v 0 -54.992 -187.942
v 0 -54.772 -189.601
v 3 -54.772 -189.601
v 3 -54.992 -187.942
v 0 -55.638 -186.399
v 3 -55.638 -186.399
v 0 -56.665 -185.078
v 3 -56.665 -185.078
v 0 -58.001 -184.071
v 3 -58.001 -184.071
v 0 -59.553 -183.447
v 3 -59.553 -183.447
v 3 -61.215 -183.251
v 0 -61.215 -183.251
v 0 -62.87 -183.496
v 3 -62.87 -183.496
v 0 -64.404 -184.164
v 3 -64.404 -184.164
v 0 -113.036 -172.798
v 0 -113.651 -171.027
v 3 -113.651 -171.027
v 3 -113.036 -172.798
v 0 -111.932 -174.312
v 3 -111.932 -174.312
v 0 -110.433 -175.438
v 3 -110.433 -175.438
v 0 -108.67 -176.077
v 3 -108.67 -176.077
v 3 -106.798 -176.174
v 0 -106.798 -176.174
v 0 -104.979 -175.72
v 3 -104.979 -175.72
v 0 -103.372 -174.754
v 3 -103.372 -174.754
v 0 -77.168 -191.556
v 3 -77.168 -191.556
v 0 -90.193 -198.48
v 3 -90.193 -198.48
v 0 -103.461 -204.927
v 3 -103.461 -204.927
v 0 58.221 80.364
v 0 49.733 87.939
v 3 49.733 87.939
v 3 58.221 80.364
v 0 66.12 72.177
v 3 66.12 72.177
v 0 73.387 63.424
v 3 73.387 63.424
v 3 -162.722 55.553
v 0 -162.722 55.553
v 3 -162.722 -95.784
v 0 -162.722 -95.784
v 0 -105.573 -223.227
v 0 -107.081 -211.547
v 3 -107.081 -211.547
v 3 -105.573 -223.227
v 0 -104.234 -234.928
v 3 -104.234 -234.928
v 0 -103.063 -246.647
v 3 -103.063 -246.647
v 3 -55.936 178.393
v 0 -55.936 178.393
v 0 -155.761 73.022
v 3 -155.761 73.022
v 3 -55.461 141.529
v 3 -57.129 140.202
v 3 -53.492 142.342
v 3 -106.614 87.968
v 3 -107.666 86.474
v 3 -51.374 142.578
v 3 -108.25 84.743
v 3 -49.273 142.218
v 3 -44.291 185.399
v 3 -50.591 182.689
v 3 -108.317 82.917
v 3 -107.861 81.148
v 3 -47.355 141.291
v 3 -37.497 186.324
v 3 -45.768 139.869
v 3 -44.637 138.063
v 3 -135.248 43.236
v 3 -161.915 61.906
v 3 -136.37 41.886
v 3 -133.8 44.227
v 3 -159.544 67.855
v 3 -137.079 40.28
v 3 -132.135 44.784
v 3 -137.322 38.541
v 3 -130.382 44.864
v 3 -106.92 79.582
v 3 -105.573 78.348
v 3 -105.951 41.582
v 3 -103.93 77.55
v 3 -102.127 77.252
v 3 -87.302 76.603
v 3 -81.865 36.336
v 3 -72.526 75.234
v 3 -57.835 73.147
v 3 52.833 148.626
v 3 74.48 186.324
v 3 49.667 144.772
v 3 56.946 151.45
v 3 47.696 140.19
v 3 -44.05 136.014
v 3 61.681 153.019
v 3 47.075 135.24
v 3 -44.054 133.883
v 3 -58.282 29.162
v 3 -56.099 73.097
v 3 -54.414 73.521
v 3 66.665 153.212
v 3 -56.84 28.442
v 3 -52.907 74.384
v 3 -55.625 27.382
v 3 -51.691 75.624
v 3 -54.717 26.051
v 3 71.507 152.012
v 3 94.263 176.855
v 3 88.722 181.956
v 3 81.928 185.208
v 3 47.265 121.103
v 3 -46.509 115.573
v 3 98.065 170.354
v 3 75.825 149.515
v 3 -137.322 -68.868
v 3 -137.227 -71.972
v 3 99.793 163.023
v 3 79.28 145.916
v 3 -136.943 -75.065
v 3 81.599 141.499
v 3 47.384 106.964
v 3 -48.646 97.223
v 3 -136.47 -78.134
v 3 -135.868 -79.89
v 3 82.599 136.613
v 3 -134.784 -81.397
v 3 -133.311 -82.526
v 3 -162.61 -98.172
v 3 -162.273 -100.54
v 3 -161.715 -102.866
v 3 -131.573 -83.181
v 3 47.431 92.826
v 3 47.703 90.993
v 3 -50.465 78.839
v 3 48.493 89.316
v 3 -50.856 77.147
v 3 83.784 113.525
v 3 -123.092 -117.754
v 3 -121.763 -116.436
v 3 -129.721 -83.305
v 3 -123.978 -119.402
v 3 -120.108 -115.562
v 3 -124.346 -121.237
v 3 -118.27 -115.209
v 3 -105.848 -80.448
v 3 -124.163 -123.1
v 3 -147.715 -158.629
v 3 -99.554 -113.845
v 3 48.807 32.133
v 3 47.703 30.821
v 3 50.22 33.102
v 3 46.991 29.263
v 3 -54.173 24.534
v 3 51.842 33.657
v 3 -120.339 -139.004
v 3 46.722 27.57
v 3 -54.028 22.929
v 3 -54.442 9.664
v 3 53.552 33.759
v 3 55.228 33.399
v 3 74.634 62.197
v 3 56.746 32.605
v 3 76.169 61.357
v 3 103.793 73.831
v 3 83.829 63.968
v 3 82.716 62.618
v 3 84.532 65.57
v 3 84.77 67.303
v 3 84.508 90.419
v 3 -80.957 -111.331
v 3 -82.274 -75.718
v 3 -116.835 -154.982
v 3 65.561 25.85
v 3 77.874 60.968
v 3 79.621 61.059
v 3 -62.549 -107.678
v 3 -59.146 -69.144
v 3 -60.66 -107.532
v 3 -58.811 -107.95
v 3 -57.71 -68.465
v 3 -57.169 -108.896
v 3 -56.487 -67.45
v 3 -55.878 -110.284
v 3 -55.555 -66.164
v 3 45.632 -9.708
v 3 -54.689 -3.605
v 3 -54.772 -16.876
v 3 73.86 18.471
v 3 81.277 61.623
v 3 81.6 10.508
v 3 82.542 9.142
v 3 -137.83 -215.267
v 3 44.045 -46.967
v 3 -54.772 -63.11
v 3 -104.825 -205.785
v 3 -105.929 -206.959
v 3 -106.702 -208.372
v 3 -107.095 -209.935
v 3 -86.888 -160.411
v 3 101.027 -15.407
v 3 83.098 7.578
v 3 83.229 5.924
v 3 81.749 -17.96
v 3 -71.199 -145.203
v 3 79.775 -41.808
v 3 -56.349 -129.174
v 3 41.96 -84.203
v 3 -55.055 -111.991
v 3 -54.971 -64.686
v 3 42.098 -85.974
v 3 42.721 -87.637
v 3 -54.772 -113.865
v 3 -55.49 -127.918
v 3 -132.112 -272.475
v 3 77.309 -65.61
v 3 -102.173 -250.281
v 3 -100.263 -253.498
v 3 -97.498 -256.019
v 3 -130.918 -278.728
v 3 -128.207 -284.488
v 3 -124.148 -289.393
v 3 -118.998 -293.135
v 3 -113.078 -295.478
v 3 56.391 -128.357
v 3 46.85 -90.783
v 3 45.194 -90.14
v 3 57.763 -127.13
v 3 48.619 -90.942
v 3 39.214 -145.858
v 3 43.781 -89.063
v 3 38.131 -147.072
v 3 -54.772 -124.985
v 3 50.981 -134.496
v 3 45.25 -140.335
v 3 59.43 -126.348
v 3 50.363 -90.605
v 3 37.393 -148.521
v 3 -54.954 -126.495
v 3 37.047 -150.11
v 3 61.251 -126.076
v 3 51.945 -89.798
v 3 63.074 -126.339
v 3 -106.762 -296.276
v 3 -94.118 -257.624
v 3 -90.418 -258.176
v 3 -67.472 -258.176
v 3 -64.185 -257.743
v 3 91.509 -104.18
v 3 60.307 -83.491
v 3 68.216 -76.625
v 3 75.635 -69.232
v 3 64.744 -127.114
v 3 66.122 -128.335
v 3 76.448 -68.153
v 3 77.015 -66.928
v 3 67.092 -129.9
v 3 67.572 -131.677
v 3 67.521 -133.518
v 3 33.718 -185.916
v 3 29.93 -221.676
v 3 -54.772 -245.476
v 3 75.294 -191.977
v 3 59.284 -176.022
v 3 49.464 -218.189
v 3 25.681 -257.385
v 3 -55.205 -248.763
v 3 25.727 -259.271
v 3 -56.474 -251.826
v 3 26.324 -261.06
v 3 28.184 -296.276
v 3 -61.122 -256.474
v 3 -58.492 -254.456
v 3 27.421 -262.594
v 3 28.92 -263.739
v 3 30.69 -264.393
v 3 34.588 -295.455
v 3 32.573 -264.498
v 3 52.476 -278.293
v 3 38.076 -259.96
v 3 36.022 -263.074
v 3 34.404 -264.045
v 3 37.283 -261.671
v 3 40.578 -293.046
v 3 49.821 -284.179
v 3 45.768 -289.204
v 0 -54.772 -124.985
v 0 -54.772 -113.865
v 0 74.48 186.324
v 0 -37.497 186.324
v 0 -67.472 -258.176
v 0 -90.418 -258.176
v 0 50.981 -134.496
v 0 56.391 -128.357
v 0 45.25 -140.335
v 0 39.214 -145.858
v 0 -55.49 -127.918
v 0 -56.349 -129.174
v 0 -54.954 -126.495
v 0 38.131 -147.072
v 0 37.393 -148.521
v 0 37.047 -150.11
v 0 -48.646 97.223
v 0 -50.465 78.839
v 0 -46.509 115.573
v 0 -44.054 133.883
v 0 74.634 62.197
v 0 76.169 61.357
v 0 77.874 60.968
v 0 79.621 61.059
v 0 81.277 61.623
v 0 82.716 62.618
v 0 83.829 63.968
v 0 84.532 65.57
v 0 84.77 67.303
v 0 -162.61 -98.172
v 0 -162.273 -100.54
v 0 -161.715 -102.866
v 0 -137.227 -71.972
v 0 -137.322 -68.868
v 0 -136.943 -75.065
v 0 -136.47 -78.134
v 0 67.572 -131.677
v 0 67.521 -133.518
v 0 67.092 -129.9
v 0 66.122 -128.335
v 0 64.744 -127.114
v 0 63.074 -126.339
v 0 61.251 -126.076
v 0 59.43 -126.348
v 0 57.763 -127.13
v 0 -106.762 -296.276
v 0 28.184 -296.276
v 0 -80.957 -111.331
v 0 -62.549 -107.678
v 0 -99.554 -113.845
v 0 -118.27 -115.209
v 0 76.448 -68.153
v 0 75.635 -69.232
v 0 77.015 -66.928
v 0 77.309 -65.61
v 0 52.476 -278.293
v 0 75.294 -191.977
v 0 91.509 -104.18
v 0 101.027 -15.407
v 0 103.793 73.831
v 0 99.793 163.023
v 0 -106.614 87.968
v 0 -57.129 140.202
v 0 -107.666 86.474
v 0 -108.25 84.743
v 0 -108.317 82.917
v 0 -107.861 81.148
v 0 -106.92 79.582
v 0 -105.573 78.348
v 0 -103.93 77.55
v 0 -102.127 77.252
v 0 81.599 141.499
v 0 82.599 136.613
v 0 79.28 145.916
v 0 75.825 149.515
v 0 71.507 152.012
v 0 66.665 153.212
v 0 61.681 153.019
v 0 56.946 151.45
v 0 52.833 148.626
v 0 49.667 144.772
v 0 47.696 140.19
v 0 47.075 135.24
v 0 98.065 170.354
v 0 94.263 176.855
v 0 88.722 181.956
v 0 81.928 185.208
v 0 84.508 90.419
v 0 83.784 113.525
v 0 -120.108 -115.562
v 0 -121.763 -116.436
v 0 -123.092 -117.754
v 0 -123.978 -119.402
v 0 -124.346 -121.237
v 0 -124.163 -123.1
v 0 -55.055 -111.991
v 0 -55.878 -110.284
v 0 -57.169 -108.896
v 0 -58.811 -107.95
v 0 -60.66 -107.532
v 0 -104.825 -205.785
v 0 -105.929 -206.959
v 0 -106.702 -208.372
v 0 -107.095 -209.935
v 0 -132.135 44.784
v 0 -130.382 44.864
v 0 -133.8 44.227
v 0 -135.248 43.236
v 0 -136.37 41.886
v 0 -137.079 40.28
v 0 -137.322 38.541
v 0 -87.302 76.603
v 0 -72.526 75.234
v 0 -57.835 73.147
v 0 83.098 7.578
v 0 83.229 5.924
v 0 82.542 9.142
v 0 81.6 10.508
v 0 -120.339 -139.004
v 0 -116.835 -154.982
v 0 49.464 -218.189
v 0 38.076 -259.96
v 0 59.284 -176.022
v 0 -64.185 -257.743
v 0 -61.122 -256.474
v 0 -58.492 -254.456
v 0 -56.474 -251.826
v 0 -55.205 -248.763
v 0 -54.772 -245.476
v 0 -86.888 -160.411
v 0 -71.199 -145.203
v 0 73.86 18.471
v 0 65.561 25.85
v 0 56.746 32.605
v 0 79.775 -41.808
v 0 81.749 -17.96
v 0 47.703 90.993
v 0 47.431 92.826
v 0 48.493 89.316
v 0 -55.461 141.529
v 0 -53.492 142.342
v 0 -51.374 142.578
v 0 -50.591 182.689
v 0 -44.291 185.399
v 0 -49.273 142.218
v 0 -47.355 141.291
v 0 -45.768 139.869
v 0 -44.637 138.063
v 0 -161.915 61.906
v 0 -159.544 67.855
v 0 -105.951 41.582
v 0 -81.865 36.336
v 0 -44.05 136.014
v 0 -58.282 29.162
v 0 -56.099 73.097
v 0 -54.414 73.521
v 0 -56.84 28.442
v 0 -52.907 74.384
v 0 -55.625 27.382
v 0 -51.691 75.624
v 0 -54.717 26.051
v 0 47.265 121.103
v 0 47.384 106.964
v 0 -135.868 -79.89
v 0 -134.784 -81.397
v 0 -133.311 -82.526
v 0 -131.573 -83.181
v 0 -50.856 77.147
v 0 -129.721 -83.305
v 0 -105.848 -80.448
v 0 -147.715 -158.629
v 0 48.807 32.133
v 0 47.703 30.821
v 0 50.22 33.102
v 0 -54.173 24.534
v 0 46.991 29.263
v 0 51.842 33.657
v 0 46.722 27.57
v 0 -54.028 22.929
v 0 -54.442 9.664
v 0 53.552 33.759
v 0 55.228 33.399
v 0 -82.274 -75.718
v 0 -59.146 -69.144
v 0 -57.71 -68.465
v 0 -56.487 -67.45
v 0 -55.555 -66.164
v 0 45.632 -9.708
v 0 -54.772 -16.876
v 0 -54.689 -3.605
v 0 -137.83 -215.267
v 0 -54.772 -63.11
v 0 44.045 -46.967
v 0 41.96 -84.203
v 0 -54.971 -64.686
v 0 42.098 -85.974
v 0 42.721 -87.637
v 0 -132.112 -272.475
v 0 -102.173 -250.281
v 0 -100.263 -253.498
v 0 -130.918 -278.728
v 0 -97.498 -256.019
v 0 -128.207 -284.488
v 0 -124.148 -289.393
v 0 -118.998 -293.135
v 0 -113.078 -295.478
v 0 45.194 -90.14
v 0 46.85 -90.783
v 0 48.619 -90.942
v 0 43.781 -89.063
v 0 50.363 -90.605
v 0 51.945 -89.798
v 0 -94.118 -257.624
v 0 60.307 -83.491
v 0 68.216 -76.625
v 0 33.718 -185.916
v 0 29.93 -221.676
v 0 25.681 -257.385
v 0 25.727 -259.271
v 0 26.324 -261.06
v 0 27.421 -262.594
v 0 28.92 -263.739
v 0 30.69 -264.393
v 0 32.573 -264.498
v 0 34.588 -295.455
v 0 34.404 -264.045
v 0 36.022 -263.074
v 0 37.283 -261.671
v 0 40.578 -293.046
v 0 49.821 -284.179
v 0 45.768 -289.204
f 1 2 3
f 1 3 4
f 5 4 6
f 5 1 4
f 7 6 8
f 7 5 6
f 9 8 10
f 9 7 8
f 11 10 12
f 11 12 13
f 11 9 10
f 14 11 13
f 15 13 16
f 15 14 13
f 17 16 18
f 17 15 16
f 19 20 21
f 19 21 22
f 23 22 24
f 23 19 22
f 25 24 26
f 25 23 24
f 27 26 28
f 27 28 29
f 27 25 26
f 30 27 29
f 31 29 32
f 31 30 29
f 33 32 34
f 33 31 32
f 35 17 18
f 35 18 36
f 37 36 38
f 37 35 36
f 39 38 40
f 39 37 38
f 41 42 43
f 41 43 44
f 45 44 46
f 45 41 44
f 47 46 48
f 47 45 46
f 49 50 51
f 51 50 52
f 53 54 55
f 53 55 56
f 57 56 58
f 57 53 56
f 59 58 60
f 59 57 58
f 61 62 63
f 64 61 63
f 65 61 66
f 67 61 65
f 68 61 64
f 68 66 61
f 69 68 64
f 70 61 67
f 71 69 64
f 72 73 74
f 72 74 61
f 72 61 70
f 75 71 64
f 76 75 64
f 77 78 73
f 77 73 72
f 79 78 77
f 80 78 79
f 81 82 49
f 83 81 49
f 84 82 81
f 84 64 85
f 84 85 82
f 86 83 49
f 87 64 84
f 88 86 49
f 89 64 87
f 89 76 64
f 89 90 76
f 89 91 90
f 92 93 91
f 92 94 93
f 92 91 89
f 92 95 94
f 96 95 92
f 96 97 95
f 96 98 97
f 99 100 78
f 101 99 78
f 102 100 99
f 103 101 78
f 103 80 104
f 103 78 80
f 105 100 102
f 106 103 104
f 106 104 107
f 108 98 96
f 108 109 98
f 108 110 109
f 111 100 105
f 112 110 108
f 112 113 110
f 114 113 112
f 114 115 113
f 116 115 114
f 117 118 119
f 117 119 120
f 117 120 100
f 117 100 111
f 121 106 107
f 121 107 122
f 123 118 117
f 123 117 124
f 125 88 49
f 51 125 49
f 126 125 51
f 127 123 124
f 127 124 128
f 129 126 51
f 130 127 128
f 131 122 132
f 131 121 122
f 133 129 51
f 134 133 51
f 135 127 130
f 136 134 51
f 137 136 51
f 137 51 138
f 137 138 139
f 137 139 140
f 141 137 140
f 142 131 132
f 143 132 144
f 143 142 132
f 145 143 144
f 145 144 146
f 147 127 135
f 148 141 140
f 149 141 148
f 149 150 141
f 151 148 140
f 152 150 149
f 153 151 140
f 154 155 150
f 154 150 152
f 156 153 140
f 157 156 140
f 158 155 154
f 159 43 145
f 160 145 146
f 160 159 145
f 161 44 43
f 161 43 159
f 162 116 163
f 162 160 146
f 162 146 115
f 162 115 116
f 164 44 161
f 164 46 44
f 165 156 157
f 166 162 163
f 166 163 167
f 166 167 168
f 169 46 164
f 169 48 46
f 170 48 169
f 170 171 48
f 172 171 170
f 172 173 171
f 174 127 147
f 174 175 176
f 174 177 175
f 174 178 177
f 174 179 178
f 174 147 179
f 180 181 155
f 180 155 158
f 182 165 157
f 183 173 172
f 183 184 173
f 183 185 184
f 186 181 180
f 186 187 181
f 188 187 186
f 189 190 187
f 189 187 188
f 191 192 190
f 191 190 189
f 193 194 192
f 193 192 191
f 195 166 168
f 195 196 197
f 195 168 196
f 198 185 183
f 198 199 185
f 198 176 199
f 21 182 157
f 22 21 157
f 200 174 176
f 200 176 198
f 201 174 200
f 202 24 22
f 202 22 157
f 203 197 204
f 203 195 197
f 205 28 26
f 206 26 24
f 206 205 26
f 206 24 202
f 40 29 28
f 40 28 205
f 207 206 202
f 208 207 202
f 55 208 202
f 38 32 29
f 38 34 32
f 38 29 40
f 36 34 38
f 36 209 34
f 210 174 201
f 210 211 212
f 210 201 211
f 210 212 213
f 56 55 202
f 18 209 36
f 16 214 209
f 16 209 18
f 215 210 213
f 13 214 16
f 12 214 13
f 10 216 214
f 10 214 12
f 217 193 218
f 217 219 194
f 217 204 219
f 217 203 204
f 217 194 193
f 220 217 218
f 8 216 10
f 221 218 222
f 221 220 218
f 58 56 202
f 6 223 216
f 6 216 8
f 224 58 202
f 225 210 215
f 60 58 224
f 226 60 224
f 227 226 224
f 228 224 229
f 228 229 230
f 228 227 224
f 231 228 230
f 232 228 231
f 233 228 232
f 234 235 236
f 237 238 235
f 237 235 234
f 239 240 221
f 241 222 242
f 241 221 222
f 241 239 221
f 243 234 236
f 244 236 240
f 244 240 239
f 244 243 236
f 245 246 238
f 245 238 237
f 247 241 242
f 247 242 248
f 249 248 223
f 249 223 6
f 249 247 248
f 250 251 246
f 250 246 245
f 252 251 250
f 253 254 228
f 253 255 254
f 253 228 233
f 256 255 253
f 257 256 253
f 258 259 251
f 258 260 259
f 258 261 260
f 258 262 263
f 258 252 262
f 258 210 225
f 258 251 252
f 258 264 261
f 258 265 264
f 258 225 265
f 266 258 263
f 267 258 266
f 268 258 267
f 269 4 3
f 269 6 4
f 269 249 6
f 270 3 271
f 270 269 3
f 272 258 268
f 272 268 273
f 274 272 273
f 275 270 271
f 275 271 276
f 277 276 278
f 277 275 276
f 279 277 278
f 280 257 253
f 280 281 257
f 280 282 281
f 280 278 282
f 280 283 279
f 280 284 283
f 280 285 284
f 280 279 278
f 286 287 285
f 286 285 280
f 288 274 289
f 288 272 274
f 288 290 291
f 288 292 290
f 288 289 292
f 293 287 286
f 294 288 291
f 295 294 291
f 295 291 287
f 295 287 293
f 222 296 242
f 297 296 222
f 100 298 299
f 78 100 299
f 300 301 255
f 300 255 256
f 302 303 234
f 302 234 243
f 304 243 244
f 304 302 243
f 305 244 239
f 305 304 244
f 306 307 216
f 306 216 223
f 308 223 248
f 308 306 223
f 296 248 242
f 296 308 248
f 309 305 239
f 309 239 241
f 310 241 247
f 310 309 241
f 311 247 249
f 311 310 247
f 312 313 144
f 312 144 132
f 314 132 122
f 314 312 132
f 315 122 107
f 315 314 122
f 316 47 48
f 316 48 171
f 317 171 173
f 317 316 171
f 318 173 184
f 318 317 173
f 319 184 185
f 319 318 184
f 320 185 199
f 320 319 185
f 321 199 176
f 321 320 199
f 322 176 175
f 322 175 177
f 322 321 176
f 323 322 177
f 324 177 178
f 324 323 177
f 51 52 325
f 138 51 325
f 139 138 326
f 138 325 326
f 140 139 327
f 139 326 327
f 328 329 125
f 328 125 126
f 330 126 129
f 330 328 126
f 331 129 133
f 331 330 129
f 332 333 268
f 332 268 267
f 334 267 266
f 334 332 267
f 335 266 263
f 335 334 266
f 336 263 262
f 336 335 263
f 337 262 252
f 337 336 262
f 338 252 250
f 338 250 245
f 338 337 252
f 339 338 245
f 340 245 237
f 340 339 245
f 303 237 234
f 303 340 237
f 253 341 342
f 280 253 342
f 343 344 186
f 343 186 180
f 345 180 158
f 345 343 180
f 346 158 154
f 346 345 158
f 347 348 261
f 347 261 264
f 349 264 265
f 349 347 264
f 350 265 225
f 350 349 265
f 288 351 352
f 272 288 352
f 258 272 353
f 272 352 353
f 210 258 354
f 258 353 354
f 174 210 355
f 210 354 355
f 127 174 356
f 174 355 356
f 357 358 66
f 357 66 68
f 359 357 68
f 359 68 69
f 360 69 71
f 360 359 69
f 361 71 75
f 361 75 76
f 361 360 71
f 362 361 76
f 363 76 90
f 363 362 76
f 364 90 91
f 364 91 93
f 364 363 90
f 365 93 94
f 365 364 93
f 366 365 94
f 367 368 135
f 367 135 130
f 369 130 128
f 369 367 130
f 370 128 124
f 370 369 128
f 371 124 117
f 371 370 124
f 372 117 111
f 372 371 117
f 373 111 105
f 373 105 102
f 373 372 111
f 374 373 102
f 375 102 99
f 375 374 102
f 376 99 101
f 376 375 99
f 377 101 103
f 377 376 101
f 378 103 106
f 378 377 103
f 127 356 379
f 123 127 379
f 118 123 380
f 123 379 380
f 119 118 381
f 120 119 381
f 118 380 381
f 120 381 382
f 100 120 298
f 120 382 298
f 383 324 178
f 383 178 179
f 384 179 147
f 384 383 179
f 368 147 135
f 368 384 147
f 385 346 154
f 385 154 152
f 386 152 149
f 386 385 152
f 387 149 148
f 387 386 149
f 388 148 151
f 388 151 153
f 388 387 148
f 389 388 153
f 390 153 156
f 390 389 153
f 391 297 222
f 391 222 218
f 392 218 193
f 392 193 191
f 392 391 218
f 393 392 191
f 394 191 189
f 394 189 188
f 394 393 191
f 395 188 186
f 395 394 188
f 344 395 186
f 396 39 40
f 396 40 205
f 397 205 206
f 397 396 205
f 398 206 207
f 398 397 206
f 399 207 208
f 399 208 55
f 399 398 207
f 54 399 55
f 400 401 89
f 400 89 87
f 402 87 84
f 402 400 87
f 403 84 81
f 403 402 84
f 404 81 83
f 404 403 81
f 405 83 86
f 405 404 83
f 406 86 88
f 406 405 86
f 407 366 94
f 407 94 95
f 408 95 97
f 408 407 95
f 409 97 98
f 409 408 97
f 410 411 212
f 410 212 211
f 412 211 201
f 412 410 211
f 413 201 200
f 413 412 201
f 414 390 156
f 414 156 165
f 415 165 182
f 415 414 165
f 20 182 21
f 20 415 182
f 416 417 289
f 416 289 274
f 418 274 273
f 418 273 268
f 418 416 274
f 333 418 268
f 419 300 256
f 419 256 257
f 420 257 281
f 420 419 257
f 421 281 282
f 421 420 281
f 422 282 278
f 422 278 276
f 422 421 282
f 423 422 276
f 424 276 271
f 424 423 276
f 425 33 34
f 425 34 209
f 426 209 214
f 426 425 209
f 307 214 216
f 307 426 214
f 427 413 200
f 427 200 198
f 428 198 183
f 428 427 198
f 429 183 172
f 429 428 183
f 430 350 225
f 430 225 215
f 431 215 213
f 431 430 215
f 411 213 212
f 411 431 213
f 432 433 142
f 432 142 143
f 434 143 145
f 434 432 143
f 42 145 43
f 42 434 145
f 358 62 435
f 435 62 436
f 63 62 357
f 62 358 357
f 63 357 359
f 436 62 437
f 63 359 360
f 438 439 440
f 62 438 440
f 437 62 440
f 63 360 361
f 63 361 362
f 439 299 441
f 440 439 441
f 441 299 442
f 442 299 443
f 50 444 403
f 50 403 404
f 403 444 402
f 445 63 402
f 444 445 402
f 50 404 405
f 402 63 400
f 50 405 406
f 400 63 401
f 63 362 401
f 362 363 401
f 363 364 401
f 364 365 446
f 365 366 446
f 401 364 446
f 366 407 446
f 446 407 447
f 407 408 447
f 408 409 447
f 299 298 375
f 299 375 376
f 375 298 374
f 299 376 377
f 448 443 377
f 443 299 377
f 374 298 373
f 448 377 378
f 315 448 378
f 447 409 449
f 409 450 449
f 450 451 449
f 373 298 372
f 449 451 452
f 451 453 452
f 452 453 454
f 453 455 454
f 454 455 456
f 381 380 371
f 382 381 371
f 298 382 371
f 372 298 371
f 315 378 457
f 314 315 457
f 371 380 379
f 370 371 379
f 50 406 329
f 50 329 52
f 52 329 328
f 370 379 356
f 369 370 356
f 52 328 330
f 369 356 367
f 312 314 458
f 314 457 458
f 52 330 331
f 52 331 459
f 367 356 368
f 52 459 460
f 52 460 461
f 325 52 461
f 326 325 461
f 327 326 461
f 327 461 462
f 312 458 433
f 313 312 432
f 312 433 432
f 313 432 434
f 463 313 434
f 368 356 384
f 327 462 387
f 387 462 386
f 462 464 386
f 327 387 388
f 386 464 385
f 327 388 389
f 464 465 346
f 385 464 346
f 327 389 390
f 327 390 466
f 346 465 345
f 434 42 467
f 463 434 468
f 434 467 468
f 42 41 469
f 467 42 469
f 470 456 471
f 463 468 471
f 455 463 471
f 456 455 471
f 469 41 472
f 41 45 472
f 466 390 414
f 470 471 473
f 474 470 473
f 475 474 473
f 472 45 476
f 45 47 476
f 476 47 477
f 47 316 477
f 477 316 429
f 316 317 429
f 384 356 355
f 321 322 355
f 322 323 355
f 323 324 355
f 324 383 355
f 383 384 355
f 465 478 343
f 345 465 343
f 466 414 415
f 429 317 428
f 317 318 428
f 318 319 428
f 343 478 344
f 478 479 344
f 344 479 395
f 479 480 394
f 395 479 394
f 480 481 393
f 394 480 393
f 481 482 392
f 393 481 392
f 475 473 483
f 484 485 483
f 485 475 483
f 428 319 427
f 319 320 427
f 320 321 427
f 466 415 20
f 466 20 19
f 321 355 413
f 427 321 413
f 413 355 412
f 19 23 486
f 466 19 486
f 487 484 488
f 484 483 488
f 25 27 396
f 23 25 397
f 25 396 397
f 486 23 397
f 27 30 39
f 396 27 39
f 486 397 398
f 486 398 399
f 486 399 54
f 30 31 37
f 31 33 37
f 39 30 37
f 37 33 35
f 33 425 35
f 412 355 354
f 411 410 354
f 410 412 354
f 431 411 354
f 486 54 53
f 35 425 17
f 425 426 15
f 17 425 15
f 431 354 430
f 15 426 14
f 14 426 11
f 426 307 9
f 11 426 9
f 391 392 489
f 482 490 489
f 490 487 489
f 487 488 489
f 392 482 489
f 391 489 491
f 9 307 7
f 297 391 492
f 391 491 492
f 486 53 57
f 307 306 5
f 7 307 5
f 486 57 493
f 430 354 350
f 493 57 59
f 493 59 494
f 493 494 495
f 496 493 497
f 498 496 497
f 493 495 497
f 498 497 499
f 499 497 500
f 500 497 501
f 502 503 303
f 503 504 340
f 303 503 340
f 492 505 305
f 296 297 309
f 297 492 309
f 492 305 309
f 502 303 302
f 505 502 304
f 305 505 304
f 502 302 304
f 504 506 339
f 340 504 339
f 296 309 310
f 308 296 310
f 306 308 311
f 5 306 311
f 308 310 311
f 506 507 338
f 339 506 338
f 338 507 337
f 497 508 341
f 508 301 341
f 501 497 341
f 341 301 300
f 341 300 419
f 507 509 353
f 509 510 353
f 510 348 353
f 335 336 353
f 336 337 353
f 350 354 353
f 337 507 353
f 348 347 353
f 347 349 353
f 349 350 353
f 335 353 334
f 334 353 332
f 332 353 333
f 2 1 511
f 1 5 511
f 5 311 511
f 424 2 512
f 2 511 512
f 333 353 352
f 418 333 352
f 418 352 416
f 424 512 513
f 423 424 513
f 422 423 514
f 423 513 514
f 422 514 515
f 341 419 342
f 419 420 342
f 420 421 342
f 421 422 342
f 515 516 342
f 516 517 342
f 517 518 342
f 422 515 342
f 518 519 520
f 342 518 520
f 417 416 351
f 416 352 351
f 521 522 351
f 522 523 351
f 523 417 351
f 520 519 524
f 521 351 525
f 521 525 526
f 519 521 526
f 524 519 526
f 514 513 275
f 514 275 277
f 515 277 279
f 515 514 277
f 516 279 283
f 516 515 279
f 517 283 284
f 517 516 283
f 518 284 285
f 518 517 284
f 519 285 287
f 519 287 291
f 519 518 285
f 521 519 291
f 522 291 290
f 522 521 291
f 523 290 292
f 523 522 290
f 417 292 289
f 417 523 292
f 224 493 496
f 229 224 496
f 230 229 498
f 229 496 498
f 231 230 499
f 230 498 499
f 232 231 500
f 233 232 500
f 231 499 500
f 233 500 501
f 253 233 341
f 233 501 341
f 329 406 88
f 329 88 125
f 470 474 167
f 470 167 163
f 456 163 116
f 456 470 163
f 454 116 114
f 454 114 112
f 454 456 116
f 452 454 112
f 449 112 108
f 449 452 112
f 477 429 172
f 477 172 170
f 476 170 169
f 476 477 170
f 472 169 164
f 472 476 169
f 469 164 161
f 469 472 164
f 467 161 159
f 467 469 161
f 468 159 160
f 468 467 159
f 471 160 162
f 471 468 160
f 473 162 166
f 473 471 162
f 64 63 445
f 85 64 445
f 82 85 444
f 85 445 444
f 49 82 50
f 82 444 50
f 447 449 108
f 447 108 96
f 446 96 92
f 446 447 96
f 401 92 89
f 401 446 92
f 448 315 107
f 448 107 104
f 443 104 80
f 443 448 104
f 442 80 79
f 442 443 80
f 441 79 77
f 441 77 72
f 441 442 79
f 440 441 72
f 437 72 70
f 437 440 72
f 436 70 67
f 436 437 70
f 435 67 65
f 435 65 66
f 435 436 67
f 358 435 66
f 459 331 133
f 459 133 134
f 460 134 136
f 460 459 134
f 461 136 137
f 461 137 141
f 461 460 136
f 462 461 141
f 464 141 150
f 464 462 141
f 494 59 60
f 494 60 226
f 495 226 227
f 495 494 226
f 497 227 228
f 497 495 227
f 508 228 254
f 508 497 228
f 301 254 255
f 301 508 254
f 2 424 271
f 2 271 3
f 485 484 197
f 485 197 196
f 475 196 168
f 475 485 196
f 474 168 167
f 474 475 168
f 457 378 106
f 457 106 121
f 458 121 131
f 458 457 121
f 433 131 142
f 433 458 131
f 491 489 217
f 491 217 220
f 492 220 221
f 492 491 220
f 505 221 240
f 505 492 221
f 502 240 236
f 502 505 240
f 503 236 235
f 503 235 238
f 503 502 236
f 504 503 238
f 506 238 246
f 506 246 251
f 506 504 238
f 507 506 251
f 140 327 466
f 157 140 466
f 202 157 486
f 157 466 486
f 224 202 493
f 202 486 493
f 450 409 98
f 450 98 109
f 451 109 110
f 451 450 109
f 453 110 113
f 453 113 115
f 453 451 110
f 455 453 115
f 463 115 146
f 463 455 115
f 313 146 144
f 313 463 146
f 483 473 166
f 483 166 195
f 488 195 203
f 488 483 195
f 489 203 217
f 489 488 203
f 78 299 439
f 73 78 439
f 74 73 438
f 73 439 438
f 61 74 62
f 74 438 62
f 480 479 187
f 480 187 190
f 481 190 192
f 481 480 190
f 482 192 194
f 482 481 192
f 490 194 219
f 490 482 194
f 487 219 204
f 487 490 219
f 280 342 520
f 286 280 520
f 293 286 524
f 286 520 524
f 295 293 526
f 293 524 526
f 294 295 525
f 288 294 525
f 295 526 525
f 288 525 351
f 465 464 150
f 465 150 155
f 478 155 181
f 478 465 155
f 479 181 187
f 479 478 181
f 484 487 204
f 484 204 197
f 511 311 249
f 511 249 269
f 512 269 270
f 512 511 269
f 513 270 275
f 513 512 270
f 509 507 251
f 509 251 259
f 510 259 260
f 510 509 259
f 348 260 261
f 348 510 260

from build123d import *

# Parameters (mm, degrees)
BOSS_EXTRUDE1_DEPTH = 3


with BuildPart() as part:
    # Sketch3 → Boss-Extrude1 (new body)
    with BuildSketch(Plane(origin=(0, 0, 0), x_dir=(0, 0, -1), z_dir=(1, 0, 0))):
        with BuildLine():
            Line((296.275579055, -106.762485274), (296.275579055, 28.183515817))
            ThreePointArc((296.275579055, 28.183515817), (291.290828585, 43.295682658), (278.29309192, 52.476323454))
            ThreePointArc((278.29309192, 52.476323454), (59.883707169, 97.109052306), (-163.023302782, 99.793218303))
            ThreePointArc((-163.023302782, 99.793218303), (-179.612272596, 91.682532966), (-186.324420945, 74.480085446))
            Line((-186.324420945, 74.480085446), (-186.324420945, -37.496742321))
            ThreePointArc((-186.324420945, -37.496742321), (-184.257501936, -47.533043008), (-178.393135002, -55.935940492))
            Line((-178.393135002, -55.935940492), (-73.021933987, -155.761288823))
            ThreePointArc((-73.021933987, -155.761288823), (-64.95546345, -160.91780672), (-55.55321993, -162.722090651))
            Line((-55.55321993, -162.722090651), (95.783603989, -162.722090651))
            ThreePointArc((95.783603989, -162.722090651), (99.360261791, -162.469009329), (102.86564516, -161.714808681))
            ThreePointArc((102.86564516, -161.714808681), (186.857264311, -142.254171864), (272.475288326, -132.112059831))
            ThreePointArc((272.475288326, -132.112059831), (289.393038593, -124.148217707), (296.275579055, -106.762485274))
        make_face()
        with BuildLine():
            Line((-140.201640509, -57.128850103), (-87.96769136, -106.613644033))
            ThreePointArc((-87.96769136, -106.613644033), (-81.148094961, -107.861160131), (-77.251705961, -102.126934444))
            ThreePointArc((-77.251705961, -102.126934444), (-76.008202248, -79.905919655), (-73.146568748, -57.834878595))
            ThreePointArc((-73.146568748, -57.834878595), (-74.384458899, -52.907294986), (-78.839479519, -50.464705473))
            ThreePointArc((-78.839479519, -50.464705473), (-106.402906269, -47.617091315), (-133.882969985, -44.053736318))
            ThreePointArc((-133.882969985, -44.053736318), (-141.821884271, -48.281517128), (-140.201640509, -57.128850103))
        make_face(mode=Mode.SUBTRACT)
        with BuildLine():
            Line((63.109549173, -54.772090651), (16.875579055, -54.772090651))
            ThreePointArc((16.875579055, -54.772090651), (-3.030152717, -54.586152411), (-22.928937744, -54.02840258))
            ThreePointArc((-22.928937744, -54.02840258), (-26.745457872, -55.128882574), (-29.161505638, -58.281594946))
            ThreePointArc((-29.161505638, -58.281594946), (-39.202655269, -93.85476168), (-44.863942819, -130.381802358))
            ThreePointArc((-44.863942819, -130.381802358), (-43.235628118, -135.248430754), (-38.54143859, -137.322090651))
            Line((-38.54143859, -137.322090651), (68.867981086, -137.322090651))
            ThreePointArc((68.867981086, -137.322090651), (73.52045107, -137.108595997), (78.133815642, -136.469906519))
            ThreePointArc((78.133815642, -136.469906519), (82.01587994, -134.088804485), (83.305445186, -129.72107148))
            ThreePointArc((83.305445186, -129.72107148), (78.315586037, -94.014248859), (69.14438597, -59.146427513))
            ThreePointArc((69.14438597, -59.146427513), (66.836279581, -55.980691964), (63.109549173, -54.772090651))
        make_face(mode=Mode.SUBTRACT)
        with BuildLine():
            Line((124.985022972, -54.772090651), (113.865129032, -54.772090651))
            ThreePointArc((113.865129032, -54.772090651), (108.895908777, -57.16869337), (107.677632388, -62.54946071))
            ThreePointArc((107.677632388, -62.54946071), (112.731044206, -90.235858533), (115.209207632, -118.270342681))
            ThreePointArc((115.209207632, -118.270342681), (117.754129966, -123.091695748), (123.099684529, -124.162733326))
            ThreePointArc((123.099684529, -124.162733326), (146.984385828, -118.546914937), (171.026989965, -113.651043346))
            ThreePointArc((171.026989965, -113.651043346), (175.823137855, -109.575179128), (174.754311259, -103.372493144))
            ThreePointArc((174.754311259, -103.372493144), (152.912685544, -78.94134113), (129.173611289, -56.349436473))
            ThreePointArc((129.173611289, -56.349436473), (127.222895395, -55.179496351), (124.985022972, -54.772090651))
        make_face(mode=Mode.SUBTRACT)
        with BuildLine():
            Line((245.475579055, -54.772090651), (189.600512971, -54.772090651))
            ThreePointArc((189.600512971, -54.772090651), (184.070618685, -58.000749725), (184.164076639, -64.403501933))
            ThreePointArc((184.164076639, -64.403501933), (195.077427987, -83.649499652), (204.927221509, -103.460891158))
            ThreePointArc((204.927221509, -103.460891158), (207.64086464, -106.360834644), (211.546531528, -107.081457582))
            ThreePointArc((211.546531528, -107.081457582), (229.074894441, -104.882673663), (246.646711113, -103.063493647))
            ThreePointArc((246.646711113, -103.063493647), (254.86076358, -98.973792541), (258.175579055, -90.417606976))
            Line((258.175579055, -90.417606976), (258.175579055, -67.472090651))
            ThreePointArc((258.175579055, -67.472090651), (254.455835176, -58.49183453), (245.475579055, -54.772090651))
        make_face(mode=Mode.SUBTRACT)
        with BuildLine():
            ThreePointArc((-63.423694749, 73.386671701), (-61.283949627, 80.468910348), (-67.303330529, 84.770499241))
            ThreePointArc((-67.303330529, 84.770499241), (-101.974198169, 84.203420455), (-136.612578489, 82.599285182))
            ThreePointArc((-136.612578489, 82.599285182), (-153.291167029, 64.166222989), (-135.240146412, 47.0748874))
            ThreePointArc((-135.240146412, 47.0748874), (-114.033668366, 47.33348842), (-92.825838328, 47.431113877))
            ThreePointArc((-92.825838328, 47.431113877), (-90.125310843, 48.036382475), (-87.938719053, 49.732853847))
            ThreePointArc((-87.938719053, 49.732853847), (-76.344200811, 62.246895478), (-63.423694749, 73.386671701))
        make_face(mode=Mode.SUBTRACT)
        with BuildLine():
            ThreePointArc((69.231514749, 75.634749617), (67.555654459, 76.763975447), (65.609872244, 77.309493785))
            ThreePointArc((65.609872244, 77.309493785), (29.88891223, 80.823452233), (-5.923738689, 83.229470179))
            ThreePointArc((-5.923738689, 83.229470179), (-8.378239234, 82.871089318), (-10.508168123, 81.599707119))
            ThreePointArc((-10.508168123, 81.599707119), (-22.236344306, 69.777534825), (-32.604624722, 56.746317095))
            ThreePointArc((-32.604624722, 56.746317095), (-33.101585539, 50.220258497), (-27.57017357, 46.721702724))
            ThreePointArc((-27.57017357, 46.721702724), (28.340185633, 44.900589153), (84.202879174, 41.960488643))
            ThreePointArc((84.202879174, 41.960488643), (90.139619886, 45.193850997), (89.79812833, 51.945362376))
            ThreePointArc((89.79812833, 51.945362376), (80.12600177, 64.320669452), (69.231514749, 75.634749617))
        make_face(mode=Mode.SUBTRACT)
        with BuildLine():
            ThreePointArc((145.858420697, 39.213689288), (147.772723887, 37.715638334), (150.109622506, 37.04659558))
            ThreePointArc((150.109622506, 37.04659558), (203.802057157, 31.881595955), (257.384776304, 25.681033985))
            ThreePointArc((257.384776304, 25.681033985), (264.392806933, 30.68986561), (259.959983781, 38.075728216))
            ThreePointArc((259.959983781, 38.075728216), (197.151625063, 54.570624598), (133.51792631, 67.521451383))
            ThreePointArc((133.51792631, 67.521451383), (126.665438798, 63.936972071), (128.357377735, 56.390951951))
            ThreePointArc((128.357377735, 56.390951951), (137.453954347, 48.154898666), (145.858420697, 39.213689288))
        make_face(mode=Mode.SUBTRACT)
    extrude(amount=BOSS_EXTRUDE1_DEPTH)


solid = part.part
